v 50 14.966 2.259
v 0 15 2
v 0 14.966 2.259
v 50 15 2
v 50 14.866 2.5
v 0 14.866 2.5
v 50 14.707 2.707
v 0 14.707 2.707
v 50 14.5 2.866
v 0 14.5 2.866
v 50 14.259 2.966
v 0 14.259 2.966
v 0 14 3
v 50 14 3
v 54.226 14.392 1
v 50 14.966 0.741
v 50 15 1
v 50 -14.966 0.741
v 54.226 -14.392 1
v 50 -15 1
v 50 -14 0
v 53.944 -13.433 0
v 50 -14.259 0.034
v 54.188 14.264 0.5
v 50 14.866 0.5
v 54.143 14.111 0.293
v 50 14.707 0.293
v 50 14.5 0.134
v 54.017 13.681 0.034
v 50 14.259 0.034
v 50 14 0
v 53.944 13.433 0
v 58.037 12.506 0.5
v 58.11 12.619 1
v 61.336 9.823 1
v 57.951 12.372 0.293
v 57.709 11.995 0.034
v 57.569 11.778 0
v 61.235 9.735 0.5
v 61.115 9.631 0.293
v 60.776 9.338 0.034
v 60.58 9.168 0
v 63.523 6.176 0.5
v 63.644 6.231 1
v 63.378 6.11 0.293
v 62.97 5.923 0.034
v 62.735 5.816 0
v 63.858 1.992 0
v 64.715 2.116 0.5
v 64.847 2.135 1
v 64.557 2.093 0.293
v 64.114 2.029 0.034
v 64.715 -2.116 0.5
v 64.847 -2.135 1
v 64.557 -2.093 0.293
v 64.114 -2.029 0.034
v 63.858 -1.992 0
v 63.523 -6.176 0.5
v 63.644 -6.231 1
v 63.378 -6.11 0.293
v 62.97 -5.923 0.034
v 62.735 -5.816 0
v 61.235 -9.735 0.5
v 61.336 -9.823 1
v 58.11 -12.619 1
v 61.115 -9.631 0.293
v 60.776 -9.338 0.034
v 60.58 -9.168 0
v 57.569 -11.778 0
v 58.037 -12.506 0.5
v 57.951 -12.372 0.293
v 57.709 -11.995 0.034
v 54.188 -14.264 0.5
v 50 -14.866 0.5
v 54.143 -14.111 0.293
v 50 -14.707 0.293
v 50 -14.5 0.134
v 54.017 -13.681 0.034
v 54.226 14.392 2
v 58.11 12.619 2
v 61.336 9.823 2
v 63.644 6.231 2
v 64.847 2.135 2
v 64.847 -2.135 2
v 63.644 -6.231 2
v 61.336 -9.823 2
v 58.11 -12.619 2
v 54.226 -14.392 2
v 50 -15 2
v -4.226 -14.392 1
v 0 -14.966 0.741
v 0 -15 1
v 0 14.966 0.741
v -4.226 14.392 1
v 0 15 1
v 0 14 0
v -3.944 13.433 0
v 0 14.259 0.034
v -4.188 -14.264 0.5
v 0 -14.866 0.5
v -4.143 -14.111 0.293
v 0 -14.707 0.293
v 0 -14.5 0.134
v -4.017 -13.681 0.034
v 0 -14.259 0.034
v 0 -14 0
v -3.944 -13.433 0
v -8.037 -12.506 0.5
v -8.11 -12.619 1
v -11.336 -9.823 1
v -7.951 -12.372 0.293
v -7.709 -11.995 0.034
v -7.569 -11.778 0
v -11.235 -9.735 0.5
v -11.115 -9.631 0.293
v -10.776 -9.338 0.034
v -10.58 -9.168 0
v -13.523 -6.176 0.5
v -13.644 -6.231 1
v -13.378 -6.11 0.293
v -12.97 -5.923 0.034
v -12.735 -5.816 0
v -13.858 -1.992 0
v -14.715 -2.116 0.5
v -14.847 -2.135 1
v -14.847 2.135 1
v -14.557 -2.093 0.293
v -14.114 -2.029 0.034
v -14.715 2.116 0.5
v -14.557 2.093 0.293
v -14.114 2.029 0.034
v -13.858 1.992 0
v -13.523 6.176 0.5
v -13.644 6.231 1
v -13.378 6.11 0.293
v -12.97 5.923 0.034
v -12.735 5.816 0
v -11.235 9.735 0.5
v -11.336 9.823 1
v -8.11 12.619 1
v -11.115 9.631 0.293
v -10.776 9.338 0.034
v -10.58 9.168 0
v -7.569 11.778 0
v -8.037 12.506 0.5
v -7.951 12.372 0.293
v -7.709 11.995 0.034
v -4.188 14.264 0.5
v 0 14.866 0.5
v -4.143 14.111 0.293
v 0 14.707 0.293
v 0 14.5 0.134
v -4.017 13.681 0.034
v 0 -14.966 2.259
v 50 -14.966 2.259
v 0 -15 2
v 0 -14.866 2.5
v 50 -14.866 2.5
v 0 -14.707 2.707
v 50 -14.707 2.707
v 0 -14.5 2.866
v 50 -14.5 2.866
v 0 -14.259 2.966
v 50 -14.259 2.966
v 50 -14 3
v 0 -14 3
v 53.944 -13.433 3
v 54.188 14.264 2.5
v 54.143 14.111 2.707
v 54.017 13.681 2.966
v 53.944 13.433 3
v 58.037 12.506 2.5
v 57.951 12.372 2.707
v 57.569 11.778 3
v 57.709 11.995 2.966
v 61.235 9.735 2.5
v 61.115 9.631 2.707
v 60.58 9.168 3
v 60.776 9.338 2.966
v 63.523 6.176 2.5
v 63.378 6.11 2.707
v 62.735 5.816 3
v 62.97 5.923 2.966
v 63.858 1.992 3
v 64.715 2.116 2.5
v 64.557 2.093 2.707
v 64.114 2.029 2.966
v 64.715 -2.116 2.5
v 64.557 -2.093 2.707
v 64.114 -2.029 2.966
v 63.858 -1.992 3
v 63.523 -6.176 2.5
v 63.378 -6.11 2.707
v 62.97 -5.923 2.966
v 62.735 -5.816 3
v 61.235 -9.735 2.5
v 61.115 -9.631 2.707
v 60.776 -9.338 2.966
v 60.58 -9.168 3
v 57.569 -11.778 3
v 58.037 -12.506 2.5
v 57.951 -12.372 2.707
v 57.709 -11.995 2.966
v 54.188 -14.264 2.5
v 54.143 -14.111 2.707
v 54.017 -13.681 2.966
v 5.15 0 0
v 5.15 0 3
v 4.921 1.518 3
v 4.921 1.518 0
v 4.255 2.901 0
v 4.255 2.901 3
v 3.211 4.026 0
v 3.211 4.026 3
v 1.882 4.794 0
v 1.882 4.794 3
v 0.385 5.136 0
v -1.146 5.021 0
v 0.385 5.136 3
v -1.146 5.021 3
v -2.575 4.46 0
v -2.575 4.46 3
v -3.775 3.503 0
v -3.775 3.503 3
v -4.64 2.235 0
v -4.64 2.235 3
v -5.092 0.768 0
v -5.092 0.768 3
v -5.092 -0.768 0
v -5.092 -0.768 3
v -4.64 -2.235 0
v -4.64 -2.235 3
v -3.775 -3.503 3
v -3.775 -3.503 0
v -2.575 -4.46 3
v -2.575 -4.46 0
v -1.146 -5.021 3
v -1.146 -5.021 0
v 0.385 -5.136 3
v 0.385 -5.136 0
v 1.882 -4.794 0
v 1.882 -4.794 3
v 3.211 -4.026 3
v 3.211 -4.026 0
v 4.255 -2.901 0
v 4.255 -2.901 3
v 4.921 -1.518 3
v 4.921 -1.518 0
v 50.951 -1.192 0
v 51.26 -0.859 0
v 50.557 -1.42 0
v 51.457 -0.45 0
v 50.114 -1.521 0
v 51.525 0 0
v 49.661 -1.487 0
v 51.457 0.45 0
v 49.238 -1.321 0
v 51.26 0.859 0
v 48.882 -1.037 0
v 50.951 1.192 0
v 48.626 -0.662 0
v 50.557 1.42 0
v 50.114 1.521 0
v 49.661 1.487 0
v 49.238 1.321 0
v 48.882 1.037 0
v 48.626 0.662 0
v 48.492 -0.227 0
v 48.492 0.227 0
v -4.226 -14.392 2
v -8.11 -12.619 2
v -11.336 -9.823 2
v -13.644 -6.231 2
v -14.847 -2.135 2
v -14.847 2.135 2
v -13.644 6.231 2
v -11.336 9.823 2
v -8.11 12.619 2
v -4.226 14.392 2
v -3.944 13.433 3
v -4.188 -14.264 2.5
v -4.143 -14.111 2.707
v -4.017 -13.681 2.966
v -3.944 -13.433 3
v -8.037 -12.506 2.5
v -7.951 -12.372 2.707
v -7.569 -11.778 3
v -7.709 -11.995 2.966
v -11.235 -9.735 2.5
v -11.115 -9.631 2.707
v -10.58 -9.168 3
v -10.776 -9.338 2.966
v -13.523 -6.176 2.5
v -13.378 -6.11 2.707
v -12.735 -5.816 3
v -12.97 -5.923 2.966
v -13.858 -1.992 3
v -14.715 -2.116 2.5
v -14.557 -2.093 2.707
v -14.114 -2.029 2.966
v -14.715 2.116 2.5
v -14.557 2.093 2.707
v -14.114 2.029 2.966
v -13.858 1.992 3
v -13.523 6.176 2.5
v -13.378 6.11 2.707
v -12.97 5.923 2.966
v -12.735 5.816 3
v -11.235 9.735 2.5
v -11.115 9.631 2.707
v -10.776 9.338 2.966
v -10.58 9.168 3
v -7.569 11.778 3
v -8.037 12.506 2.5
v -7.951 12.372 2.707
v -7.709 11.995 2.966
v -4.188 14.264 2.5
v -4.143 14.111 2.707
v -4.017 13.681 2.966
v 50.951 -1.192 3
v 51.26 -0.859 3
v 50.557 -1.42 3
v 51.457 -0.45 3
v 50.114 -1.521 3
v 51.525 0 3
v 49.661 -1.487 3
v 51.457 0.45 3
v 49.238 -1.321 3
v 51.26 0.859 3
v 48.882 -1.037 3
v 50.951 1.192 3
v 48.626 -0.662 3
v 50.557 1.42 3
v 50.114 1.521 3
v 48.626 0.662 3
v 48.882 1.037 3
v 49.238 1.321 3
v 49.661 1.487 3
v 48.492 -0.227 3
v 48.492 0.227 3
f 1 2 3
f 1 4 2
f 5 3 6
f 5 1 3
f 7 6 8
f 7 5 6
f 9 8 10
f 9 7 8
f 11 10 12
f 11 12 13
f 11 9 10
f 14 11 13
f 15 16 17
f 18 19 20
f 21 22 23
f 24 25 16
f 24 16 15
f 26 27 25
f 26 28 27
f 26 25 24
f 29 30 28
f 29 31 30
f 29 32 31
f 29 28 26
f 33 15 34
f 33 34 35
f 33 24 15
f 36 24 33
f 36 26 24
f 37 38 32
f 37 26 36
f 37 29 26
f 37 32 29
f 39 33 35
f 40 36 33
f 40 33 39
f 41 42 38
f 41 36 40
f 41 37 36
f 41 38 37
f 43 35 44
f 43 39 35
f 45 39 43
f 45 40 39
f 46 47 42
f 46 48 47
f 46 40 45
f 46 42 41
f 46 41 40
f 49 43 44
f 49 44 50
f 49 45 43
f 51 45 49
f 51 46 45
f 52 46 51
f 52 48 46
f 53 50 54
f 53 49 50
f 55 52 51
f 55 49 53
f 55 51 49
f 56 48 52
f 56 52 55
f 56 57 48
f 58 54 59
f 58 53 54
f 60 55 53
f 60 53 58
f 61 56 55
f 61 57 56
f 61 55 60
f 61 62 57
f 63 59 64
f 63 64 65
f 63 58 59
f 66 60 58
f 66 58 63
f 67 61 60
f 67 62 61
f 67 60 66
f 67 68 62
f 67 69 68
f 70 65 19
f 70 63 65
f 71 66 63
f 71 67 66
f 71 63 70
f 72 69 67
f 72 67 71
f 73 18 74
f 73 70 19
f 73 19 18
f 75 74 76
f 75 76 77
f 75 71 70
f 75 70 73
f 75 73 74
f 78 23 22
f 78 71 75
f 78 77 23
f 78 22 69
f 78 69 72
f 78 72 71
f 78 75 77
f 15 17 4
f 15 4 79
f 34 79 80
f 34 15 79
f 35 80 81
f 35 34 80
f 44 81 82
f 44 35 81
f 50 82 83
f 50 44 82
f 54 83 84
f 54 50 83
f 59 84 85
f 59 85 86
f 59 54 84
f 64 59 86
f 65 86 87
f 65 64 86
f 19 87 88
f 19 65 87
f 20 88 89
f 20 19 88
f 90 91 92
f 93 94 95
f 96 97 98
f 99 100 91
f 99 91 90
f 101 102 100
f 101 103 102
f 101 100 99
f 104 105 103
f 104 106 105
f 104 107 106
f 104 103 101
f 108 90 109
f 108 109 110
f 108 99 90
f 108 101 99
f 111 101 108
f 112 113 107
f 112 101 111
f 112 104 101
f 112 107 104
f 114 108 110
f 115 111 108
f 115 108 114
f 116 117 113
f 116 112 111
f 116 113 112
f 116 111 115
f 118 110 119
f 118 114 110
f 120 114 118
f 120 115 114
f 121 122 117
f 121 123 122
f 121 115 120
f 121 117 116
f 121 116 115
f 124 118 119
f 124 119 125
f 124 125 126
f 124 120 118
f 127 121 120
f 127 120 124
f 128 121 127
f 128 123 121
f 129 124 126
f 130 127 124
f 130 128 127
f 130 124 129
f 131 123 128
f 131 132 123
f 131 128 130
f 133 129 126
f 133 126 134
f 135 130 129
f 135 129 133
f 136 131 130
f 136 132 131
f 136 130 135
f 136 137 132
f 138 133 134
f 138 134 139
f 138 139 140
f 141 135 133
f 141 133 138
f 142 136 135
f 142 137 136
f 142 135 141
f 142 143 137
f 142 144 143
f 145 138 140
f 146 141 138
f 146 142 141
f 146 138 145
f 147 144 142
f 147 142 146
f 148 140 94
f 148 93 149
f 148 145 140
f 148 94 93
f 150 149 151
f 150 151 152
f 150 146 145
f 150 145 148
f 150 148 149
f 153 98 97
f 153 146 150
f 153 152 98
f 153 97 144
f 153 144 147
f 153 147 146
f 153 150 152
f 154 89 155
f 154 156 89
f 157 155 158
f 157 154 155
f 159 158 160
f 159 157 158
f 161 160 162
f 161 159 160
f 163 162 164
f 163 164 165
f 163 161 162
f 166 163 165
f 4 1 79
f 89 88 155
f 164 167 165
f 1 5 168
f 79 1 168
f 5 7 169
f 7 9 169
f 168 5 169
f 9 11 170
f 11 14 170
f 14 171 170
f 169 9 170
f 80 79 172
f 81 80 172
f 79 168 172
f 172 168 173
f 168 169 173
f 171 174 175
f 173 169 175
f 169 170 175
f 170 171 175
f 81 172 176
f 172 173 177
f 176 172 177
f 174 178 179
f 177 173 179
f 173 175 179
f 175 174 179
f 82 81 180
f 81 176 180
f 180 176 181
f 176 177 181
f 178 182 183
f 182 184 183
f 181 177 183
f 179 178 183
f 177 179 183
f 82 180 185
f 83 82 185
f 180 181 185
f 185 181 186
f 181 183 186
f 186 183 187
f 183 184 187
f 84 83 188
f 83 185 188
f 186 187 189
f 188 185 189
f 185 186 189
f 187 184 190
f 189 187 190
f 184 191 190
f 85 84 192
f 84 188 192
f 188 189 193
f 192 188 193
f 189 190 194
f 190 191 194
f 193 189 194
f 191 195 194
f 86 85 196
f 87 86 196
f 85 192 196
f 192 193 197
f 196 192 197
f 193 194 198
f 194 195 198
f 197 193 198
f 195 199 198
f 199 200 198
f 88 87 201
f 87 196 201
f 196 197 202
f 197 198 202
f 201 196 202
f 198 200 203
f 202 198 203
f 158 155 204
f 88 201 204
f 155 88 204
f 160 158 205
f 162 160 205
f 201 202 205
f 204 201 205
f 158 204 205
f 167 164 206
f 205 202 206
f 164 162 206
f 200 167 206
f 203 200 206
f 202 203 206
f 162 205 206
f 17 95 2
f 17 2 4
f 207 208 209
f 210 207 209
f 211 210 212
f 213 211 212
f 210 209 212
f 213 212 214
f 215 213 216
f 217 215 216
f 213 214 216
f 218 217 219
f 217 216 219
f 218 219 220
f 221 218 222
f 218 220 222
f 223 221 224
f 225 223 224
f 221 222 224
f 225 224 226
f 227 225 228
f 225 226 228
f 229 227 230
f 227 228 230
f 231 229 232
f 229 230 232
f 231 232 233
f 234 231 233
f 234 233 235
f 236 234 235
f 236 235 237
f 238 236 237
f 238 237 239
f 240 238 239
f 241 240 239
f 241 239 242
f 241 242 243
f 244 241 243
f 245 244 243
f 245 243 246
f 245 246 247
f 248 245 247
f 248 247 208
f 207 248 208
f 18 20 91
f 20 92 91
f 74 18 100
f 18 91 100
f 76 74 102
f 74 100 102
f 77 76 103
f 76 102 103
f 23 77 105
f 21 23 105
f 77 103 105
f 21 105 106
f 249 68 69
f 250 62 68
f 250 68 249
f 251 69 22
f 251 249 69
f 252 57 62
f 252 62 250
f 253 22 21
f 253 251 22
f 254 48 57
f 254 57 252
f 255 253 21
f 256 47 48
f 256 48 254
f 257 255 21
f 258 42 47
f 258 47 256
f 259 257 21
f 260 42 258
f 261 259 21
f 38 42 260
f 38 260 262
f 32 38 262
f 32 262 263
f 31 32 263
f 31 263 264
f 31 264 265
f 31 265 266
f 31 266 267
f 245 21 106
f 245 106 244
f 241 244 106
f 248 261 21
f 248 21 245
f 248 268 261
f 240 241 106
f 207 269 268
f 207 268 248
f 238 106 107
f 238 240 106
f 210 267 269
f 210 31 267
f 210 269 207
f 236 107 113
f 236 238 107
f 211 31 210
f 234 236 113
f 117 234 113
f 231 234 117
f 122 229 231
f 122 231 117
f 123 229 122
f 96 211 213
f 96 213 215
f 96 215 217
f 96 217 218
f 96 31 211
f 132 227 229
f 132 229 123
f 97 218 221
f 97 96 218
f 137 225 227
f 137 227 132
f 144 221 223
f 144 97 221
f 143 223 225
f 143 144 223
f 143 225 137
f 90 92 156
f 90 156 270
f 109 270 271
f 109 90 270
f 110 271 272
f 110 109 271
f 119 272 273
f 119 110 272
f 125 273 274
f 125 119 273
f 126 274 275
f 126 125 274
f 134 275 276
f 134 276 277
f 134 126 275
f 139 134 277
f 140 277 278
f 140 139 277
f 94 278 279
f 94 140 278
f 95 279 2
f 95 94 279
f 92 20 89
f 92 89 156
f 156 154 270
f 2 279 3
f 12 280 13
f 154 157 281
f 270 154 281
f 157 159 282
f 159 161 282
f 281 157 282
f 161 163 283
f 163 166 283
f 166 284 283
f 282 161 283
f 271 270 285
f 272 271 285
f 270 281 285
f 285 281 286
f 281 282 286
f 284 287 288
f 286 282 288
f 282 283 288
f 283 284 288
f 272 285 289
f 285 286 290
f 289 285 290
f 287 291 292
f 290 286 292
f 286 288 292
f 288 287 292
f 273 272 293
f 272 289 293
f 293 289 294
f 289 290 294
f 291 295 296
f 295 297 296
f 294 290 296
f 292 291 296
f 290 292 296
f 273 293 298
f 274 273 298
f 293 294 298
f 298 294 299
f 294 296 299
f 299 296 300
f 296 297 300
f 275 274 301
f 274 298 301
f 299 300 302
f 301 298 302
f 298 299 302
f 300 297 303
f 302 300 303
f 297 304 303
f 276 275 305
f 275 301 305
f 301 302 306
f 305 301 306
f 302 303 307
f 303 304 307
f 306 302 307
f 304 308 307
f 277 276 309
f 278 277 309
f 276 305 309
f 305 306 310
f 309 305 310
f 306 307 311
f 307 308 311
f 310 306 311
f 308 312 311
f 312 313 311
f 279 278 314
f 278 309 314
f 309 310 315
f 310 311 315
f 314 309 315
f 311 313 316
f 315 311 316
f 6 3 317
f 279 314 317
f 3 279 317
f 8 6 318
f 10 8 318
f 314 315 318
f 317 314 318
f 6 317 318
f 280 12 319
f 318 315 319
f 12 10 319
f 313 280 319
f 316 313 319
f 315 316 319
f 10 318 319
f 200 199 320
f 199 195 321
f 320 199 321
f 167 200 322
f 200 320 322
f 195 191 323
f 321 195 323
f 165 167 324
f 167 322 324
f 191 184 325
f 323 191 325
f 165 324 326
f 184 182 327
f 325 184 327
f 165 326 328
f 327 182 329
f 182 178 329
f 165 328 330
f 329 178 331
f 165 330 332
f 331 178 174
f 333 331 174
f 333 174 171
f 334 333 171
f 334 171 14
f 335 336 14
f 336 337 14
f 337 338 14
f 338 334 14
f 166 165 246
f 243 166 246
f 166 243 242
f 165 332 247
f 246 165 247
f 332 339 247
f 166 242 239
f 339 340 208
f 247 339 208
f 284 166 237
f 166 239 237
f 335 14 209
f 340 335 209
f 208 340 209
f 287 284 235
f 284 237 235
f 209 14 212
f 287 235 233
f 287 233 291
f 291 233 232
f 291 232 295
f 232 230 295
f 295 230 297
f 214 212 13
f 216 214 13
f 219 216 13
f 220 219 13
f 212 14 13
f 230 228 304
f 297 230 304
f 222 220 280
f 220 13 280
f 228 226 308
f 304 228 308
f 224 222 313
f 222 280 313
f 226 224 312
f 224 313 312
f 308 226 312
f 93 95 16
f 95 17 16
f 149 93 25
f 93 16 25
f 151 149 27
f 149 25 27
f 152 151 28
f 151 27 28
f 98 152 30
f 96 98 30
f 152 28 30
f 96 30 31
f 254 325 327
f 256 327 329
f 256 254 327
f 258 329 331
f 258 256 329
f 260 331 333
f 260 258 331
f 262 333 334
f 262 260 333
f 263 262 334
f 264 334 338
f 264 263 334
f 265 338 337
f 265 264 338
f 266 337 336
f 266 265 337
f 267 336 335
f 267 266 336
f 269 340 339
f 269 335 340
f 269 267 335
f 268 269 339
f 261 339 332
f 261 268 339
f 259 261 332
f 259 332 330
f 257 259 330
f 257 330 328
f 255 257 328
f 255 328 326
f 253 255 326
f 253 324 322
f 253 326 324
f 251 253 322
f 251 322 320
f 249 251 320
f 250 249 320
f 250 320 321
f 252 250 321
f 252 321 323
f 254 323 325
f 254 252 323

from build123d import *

# Parameters (mm, degrees)
EXTRUDE_1_DEPTH     = 3
SKETCH_1_3_R        = 1.525
CUT_EXTRUDE_1_DEPTH = 5
FILLET_1_R          = 1
SKETCH_2_R          = 5.15
CUT_EXTRUDE_2_DEPTH = 5


with BuildPart() as part:
    # 草图1 → 凸台-拉伸1 (new body)
    with BuildSketch(Plane.XY):
        with BuildLine():
            Line((0, 15), (50, 15))
            ThreePointArc((50, 15), (65, 0), (50, -15))
            Line((50, -15), (0, -15))
            ThreePointArc((0, -15), (-15, 0), (0, 15))
        make_face()
    extrude(amount=EXTRUDE_1_DEPTH)

    # 草图1<3> → 切除-拉伸1 (cut)
    with BuildSketch(Plane.XY):
        with Locations((50, 0)):
            Circle(SKETCH_1_3_R)
    extrude(amount=CUT_EXTRUDE_1_DEPTH, mode=Mode.SUBTRACT)

    # 圆角1
    fillet_1_edges = [part.edges().sort_by_distance(p)[0] for p in [
        (65, 0, 3),
        (25, 15, 3),
        (-15, 0, 3),
        (25, 15, 0),
        (65, 0, 0),
        (25, -15, 0),
        (-15, 0, 0),
        (25, -15, 3),
    ]]
    fillet(fillet_1_edges, radius=FILLET_1_R)

    # 草图2 → 切除-拉伸2 (cut)
    with BuildSketch(Plane.XY.offset(3)):
        Circle(SKETCH_2_R)
    extrude(amount=-CUT_EXTRUDE_2_DEPTH, mode=Mode.SUBTRACT)


solid = part.part
